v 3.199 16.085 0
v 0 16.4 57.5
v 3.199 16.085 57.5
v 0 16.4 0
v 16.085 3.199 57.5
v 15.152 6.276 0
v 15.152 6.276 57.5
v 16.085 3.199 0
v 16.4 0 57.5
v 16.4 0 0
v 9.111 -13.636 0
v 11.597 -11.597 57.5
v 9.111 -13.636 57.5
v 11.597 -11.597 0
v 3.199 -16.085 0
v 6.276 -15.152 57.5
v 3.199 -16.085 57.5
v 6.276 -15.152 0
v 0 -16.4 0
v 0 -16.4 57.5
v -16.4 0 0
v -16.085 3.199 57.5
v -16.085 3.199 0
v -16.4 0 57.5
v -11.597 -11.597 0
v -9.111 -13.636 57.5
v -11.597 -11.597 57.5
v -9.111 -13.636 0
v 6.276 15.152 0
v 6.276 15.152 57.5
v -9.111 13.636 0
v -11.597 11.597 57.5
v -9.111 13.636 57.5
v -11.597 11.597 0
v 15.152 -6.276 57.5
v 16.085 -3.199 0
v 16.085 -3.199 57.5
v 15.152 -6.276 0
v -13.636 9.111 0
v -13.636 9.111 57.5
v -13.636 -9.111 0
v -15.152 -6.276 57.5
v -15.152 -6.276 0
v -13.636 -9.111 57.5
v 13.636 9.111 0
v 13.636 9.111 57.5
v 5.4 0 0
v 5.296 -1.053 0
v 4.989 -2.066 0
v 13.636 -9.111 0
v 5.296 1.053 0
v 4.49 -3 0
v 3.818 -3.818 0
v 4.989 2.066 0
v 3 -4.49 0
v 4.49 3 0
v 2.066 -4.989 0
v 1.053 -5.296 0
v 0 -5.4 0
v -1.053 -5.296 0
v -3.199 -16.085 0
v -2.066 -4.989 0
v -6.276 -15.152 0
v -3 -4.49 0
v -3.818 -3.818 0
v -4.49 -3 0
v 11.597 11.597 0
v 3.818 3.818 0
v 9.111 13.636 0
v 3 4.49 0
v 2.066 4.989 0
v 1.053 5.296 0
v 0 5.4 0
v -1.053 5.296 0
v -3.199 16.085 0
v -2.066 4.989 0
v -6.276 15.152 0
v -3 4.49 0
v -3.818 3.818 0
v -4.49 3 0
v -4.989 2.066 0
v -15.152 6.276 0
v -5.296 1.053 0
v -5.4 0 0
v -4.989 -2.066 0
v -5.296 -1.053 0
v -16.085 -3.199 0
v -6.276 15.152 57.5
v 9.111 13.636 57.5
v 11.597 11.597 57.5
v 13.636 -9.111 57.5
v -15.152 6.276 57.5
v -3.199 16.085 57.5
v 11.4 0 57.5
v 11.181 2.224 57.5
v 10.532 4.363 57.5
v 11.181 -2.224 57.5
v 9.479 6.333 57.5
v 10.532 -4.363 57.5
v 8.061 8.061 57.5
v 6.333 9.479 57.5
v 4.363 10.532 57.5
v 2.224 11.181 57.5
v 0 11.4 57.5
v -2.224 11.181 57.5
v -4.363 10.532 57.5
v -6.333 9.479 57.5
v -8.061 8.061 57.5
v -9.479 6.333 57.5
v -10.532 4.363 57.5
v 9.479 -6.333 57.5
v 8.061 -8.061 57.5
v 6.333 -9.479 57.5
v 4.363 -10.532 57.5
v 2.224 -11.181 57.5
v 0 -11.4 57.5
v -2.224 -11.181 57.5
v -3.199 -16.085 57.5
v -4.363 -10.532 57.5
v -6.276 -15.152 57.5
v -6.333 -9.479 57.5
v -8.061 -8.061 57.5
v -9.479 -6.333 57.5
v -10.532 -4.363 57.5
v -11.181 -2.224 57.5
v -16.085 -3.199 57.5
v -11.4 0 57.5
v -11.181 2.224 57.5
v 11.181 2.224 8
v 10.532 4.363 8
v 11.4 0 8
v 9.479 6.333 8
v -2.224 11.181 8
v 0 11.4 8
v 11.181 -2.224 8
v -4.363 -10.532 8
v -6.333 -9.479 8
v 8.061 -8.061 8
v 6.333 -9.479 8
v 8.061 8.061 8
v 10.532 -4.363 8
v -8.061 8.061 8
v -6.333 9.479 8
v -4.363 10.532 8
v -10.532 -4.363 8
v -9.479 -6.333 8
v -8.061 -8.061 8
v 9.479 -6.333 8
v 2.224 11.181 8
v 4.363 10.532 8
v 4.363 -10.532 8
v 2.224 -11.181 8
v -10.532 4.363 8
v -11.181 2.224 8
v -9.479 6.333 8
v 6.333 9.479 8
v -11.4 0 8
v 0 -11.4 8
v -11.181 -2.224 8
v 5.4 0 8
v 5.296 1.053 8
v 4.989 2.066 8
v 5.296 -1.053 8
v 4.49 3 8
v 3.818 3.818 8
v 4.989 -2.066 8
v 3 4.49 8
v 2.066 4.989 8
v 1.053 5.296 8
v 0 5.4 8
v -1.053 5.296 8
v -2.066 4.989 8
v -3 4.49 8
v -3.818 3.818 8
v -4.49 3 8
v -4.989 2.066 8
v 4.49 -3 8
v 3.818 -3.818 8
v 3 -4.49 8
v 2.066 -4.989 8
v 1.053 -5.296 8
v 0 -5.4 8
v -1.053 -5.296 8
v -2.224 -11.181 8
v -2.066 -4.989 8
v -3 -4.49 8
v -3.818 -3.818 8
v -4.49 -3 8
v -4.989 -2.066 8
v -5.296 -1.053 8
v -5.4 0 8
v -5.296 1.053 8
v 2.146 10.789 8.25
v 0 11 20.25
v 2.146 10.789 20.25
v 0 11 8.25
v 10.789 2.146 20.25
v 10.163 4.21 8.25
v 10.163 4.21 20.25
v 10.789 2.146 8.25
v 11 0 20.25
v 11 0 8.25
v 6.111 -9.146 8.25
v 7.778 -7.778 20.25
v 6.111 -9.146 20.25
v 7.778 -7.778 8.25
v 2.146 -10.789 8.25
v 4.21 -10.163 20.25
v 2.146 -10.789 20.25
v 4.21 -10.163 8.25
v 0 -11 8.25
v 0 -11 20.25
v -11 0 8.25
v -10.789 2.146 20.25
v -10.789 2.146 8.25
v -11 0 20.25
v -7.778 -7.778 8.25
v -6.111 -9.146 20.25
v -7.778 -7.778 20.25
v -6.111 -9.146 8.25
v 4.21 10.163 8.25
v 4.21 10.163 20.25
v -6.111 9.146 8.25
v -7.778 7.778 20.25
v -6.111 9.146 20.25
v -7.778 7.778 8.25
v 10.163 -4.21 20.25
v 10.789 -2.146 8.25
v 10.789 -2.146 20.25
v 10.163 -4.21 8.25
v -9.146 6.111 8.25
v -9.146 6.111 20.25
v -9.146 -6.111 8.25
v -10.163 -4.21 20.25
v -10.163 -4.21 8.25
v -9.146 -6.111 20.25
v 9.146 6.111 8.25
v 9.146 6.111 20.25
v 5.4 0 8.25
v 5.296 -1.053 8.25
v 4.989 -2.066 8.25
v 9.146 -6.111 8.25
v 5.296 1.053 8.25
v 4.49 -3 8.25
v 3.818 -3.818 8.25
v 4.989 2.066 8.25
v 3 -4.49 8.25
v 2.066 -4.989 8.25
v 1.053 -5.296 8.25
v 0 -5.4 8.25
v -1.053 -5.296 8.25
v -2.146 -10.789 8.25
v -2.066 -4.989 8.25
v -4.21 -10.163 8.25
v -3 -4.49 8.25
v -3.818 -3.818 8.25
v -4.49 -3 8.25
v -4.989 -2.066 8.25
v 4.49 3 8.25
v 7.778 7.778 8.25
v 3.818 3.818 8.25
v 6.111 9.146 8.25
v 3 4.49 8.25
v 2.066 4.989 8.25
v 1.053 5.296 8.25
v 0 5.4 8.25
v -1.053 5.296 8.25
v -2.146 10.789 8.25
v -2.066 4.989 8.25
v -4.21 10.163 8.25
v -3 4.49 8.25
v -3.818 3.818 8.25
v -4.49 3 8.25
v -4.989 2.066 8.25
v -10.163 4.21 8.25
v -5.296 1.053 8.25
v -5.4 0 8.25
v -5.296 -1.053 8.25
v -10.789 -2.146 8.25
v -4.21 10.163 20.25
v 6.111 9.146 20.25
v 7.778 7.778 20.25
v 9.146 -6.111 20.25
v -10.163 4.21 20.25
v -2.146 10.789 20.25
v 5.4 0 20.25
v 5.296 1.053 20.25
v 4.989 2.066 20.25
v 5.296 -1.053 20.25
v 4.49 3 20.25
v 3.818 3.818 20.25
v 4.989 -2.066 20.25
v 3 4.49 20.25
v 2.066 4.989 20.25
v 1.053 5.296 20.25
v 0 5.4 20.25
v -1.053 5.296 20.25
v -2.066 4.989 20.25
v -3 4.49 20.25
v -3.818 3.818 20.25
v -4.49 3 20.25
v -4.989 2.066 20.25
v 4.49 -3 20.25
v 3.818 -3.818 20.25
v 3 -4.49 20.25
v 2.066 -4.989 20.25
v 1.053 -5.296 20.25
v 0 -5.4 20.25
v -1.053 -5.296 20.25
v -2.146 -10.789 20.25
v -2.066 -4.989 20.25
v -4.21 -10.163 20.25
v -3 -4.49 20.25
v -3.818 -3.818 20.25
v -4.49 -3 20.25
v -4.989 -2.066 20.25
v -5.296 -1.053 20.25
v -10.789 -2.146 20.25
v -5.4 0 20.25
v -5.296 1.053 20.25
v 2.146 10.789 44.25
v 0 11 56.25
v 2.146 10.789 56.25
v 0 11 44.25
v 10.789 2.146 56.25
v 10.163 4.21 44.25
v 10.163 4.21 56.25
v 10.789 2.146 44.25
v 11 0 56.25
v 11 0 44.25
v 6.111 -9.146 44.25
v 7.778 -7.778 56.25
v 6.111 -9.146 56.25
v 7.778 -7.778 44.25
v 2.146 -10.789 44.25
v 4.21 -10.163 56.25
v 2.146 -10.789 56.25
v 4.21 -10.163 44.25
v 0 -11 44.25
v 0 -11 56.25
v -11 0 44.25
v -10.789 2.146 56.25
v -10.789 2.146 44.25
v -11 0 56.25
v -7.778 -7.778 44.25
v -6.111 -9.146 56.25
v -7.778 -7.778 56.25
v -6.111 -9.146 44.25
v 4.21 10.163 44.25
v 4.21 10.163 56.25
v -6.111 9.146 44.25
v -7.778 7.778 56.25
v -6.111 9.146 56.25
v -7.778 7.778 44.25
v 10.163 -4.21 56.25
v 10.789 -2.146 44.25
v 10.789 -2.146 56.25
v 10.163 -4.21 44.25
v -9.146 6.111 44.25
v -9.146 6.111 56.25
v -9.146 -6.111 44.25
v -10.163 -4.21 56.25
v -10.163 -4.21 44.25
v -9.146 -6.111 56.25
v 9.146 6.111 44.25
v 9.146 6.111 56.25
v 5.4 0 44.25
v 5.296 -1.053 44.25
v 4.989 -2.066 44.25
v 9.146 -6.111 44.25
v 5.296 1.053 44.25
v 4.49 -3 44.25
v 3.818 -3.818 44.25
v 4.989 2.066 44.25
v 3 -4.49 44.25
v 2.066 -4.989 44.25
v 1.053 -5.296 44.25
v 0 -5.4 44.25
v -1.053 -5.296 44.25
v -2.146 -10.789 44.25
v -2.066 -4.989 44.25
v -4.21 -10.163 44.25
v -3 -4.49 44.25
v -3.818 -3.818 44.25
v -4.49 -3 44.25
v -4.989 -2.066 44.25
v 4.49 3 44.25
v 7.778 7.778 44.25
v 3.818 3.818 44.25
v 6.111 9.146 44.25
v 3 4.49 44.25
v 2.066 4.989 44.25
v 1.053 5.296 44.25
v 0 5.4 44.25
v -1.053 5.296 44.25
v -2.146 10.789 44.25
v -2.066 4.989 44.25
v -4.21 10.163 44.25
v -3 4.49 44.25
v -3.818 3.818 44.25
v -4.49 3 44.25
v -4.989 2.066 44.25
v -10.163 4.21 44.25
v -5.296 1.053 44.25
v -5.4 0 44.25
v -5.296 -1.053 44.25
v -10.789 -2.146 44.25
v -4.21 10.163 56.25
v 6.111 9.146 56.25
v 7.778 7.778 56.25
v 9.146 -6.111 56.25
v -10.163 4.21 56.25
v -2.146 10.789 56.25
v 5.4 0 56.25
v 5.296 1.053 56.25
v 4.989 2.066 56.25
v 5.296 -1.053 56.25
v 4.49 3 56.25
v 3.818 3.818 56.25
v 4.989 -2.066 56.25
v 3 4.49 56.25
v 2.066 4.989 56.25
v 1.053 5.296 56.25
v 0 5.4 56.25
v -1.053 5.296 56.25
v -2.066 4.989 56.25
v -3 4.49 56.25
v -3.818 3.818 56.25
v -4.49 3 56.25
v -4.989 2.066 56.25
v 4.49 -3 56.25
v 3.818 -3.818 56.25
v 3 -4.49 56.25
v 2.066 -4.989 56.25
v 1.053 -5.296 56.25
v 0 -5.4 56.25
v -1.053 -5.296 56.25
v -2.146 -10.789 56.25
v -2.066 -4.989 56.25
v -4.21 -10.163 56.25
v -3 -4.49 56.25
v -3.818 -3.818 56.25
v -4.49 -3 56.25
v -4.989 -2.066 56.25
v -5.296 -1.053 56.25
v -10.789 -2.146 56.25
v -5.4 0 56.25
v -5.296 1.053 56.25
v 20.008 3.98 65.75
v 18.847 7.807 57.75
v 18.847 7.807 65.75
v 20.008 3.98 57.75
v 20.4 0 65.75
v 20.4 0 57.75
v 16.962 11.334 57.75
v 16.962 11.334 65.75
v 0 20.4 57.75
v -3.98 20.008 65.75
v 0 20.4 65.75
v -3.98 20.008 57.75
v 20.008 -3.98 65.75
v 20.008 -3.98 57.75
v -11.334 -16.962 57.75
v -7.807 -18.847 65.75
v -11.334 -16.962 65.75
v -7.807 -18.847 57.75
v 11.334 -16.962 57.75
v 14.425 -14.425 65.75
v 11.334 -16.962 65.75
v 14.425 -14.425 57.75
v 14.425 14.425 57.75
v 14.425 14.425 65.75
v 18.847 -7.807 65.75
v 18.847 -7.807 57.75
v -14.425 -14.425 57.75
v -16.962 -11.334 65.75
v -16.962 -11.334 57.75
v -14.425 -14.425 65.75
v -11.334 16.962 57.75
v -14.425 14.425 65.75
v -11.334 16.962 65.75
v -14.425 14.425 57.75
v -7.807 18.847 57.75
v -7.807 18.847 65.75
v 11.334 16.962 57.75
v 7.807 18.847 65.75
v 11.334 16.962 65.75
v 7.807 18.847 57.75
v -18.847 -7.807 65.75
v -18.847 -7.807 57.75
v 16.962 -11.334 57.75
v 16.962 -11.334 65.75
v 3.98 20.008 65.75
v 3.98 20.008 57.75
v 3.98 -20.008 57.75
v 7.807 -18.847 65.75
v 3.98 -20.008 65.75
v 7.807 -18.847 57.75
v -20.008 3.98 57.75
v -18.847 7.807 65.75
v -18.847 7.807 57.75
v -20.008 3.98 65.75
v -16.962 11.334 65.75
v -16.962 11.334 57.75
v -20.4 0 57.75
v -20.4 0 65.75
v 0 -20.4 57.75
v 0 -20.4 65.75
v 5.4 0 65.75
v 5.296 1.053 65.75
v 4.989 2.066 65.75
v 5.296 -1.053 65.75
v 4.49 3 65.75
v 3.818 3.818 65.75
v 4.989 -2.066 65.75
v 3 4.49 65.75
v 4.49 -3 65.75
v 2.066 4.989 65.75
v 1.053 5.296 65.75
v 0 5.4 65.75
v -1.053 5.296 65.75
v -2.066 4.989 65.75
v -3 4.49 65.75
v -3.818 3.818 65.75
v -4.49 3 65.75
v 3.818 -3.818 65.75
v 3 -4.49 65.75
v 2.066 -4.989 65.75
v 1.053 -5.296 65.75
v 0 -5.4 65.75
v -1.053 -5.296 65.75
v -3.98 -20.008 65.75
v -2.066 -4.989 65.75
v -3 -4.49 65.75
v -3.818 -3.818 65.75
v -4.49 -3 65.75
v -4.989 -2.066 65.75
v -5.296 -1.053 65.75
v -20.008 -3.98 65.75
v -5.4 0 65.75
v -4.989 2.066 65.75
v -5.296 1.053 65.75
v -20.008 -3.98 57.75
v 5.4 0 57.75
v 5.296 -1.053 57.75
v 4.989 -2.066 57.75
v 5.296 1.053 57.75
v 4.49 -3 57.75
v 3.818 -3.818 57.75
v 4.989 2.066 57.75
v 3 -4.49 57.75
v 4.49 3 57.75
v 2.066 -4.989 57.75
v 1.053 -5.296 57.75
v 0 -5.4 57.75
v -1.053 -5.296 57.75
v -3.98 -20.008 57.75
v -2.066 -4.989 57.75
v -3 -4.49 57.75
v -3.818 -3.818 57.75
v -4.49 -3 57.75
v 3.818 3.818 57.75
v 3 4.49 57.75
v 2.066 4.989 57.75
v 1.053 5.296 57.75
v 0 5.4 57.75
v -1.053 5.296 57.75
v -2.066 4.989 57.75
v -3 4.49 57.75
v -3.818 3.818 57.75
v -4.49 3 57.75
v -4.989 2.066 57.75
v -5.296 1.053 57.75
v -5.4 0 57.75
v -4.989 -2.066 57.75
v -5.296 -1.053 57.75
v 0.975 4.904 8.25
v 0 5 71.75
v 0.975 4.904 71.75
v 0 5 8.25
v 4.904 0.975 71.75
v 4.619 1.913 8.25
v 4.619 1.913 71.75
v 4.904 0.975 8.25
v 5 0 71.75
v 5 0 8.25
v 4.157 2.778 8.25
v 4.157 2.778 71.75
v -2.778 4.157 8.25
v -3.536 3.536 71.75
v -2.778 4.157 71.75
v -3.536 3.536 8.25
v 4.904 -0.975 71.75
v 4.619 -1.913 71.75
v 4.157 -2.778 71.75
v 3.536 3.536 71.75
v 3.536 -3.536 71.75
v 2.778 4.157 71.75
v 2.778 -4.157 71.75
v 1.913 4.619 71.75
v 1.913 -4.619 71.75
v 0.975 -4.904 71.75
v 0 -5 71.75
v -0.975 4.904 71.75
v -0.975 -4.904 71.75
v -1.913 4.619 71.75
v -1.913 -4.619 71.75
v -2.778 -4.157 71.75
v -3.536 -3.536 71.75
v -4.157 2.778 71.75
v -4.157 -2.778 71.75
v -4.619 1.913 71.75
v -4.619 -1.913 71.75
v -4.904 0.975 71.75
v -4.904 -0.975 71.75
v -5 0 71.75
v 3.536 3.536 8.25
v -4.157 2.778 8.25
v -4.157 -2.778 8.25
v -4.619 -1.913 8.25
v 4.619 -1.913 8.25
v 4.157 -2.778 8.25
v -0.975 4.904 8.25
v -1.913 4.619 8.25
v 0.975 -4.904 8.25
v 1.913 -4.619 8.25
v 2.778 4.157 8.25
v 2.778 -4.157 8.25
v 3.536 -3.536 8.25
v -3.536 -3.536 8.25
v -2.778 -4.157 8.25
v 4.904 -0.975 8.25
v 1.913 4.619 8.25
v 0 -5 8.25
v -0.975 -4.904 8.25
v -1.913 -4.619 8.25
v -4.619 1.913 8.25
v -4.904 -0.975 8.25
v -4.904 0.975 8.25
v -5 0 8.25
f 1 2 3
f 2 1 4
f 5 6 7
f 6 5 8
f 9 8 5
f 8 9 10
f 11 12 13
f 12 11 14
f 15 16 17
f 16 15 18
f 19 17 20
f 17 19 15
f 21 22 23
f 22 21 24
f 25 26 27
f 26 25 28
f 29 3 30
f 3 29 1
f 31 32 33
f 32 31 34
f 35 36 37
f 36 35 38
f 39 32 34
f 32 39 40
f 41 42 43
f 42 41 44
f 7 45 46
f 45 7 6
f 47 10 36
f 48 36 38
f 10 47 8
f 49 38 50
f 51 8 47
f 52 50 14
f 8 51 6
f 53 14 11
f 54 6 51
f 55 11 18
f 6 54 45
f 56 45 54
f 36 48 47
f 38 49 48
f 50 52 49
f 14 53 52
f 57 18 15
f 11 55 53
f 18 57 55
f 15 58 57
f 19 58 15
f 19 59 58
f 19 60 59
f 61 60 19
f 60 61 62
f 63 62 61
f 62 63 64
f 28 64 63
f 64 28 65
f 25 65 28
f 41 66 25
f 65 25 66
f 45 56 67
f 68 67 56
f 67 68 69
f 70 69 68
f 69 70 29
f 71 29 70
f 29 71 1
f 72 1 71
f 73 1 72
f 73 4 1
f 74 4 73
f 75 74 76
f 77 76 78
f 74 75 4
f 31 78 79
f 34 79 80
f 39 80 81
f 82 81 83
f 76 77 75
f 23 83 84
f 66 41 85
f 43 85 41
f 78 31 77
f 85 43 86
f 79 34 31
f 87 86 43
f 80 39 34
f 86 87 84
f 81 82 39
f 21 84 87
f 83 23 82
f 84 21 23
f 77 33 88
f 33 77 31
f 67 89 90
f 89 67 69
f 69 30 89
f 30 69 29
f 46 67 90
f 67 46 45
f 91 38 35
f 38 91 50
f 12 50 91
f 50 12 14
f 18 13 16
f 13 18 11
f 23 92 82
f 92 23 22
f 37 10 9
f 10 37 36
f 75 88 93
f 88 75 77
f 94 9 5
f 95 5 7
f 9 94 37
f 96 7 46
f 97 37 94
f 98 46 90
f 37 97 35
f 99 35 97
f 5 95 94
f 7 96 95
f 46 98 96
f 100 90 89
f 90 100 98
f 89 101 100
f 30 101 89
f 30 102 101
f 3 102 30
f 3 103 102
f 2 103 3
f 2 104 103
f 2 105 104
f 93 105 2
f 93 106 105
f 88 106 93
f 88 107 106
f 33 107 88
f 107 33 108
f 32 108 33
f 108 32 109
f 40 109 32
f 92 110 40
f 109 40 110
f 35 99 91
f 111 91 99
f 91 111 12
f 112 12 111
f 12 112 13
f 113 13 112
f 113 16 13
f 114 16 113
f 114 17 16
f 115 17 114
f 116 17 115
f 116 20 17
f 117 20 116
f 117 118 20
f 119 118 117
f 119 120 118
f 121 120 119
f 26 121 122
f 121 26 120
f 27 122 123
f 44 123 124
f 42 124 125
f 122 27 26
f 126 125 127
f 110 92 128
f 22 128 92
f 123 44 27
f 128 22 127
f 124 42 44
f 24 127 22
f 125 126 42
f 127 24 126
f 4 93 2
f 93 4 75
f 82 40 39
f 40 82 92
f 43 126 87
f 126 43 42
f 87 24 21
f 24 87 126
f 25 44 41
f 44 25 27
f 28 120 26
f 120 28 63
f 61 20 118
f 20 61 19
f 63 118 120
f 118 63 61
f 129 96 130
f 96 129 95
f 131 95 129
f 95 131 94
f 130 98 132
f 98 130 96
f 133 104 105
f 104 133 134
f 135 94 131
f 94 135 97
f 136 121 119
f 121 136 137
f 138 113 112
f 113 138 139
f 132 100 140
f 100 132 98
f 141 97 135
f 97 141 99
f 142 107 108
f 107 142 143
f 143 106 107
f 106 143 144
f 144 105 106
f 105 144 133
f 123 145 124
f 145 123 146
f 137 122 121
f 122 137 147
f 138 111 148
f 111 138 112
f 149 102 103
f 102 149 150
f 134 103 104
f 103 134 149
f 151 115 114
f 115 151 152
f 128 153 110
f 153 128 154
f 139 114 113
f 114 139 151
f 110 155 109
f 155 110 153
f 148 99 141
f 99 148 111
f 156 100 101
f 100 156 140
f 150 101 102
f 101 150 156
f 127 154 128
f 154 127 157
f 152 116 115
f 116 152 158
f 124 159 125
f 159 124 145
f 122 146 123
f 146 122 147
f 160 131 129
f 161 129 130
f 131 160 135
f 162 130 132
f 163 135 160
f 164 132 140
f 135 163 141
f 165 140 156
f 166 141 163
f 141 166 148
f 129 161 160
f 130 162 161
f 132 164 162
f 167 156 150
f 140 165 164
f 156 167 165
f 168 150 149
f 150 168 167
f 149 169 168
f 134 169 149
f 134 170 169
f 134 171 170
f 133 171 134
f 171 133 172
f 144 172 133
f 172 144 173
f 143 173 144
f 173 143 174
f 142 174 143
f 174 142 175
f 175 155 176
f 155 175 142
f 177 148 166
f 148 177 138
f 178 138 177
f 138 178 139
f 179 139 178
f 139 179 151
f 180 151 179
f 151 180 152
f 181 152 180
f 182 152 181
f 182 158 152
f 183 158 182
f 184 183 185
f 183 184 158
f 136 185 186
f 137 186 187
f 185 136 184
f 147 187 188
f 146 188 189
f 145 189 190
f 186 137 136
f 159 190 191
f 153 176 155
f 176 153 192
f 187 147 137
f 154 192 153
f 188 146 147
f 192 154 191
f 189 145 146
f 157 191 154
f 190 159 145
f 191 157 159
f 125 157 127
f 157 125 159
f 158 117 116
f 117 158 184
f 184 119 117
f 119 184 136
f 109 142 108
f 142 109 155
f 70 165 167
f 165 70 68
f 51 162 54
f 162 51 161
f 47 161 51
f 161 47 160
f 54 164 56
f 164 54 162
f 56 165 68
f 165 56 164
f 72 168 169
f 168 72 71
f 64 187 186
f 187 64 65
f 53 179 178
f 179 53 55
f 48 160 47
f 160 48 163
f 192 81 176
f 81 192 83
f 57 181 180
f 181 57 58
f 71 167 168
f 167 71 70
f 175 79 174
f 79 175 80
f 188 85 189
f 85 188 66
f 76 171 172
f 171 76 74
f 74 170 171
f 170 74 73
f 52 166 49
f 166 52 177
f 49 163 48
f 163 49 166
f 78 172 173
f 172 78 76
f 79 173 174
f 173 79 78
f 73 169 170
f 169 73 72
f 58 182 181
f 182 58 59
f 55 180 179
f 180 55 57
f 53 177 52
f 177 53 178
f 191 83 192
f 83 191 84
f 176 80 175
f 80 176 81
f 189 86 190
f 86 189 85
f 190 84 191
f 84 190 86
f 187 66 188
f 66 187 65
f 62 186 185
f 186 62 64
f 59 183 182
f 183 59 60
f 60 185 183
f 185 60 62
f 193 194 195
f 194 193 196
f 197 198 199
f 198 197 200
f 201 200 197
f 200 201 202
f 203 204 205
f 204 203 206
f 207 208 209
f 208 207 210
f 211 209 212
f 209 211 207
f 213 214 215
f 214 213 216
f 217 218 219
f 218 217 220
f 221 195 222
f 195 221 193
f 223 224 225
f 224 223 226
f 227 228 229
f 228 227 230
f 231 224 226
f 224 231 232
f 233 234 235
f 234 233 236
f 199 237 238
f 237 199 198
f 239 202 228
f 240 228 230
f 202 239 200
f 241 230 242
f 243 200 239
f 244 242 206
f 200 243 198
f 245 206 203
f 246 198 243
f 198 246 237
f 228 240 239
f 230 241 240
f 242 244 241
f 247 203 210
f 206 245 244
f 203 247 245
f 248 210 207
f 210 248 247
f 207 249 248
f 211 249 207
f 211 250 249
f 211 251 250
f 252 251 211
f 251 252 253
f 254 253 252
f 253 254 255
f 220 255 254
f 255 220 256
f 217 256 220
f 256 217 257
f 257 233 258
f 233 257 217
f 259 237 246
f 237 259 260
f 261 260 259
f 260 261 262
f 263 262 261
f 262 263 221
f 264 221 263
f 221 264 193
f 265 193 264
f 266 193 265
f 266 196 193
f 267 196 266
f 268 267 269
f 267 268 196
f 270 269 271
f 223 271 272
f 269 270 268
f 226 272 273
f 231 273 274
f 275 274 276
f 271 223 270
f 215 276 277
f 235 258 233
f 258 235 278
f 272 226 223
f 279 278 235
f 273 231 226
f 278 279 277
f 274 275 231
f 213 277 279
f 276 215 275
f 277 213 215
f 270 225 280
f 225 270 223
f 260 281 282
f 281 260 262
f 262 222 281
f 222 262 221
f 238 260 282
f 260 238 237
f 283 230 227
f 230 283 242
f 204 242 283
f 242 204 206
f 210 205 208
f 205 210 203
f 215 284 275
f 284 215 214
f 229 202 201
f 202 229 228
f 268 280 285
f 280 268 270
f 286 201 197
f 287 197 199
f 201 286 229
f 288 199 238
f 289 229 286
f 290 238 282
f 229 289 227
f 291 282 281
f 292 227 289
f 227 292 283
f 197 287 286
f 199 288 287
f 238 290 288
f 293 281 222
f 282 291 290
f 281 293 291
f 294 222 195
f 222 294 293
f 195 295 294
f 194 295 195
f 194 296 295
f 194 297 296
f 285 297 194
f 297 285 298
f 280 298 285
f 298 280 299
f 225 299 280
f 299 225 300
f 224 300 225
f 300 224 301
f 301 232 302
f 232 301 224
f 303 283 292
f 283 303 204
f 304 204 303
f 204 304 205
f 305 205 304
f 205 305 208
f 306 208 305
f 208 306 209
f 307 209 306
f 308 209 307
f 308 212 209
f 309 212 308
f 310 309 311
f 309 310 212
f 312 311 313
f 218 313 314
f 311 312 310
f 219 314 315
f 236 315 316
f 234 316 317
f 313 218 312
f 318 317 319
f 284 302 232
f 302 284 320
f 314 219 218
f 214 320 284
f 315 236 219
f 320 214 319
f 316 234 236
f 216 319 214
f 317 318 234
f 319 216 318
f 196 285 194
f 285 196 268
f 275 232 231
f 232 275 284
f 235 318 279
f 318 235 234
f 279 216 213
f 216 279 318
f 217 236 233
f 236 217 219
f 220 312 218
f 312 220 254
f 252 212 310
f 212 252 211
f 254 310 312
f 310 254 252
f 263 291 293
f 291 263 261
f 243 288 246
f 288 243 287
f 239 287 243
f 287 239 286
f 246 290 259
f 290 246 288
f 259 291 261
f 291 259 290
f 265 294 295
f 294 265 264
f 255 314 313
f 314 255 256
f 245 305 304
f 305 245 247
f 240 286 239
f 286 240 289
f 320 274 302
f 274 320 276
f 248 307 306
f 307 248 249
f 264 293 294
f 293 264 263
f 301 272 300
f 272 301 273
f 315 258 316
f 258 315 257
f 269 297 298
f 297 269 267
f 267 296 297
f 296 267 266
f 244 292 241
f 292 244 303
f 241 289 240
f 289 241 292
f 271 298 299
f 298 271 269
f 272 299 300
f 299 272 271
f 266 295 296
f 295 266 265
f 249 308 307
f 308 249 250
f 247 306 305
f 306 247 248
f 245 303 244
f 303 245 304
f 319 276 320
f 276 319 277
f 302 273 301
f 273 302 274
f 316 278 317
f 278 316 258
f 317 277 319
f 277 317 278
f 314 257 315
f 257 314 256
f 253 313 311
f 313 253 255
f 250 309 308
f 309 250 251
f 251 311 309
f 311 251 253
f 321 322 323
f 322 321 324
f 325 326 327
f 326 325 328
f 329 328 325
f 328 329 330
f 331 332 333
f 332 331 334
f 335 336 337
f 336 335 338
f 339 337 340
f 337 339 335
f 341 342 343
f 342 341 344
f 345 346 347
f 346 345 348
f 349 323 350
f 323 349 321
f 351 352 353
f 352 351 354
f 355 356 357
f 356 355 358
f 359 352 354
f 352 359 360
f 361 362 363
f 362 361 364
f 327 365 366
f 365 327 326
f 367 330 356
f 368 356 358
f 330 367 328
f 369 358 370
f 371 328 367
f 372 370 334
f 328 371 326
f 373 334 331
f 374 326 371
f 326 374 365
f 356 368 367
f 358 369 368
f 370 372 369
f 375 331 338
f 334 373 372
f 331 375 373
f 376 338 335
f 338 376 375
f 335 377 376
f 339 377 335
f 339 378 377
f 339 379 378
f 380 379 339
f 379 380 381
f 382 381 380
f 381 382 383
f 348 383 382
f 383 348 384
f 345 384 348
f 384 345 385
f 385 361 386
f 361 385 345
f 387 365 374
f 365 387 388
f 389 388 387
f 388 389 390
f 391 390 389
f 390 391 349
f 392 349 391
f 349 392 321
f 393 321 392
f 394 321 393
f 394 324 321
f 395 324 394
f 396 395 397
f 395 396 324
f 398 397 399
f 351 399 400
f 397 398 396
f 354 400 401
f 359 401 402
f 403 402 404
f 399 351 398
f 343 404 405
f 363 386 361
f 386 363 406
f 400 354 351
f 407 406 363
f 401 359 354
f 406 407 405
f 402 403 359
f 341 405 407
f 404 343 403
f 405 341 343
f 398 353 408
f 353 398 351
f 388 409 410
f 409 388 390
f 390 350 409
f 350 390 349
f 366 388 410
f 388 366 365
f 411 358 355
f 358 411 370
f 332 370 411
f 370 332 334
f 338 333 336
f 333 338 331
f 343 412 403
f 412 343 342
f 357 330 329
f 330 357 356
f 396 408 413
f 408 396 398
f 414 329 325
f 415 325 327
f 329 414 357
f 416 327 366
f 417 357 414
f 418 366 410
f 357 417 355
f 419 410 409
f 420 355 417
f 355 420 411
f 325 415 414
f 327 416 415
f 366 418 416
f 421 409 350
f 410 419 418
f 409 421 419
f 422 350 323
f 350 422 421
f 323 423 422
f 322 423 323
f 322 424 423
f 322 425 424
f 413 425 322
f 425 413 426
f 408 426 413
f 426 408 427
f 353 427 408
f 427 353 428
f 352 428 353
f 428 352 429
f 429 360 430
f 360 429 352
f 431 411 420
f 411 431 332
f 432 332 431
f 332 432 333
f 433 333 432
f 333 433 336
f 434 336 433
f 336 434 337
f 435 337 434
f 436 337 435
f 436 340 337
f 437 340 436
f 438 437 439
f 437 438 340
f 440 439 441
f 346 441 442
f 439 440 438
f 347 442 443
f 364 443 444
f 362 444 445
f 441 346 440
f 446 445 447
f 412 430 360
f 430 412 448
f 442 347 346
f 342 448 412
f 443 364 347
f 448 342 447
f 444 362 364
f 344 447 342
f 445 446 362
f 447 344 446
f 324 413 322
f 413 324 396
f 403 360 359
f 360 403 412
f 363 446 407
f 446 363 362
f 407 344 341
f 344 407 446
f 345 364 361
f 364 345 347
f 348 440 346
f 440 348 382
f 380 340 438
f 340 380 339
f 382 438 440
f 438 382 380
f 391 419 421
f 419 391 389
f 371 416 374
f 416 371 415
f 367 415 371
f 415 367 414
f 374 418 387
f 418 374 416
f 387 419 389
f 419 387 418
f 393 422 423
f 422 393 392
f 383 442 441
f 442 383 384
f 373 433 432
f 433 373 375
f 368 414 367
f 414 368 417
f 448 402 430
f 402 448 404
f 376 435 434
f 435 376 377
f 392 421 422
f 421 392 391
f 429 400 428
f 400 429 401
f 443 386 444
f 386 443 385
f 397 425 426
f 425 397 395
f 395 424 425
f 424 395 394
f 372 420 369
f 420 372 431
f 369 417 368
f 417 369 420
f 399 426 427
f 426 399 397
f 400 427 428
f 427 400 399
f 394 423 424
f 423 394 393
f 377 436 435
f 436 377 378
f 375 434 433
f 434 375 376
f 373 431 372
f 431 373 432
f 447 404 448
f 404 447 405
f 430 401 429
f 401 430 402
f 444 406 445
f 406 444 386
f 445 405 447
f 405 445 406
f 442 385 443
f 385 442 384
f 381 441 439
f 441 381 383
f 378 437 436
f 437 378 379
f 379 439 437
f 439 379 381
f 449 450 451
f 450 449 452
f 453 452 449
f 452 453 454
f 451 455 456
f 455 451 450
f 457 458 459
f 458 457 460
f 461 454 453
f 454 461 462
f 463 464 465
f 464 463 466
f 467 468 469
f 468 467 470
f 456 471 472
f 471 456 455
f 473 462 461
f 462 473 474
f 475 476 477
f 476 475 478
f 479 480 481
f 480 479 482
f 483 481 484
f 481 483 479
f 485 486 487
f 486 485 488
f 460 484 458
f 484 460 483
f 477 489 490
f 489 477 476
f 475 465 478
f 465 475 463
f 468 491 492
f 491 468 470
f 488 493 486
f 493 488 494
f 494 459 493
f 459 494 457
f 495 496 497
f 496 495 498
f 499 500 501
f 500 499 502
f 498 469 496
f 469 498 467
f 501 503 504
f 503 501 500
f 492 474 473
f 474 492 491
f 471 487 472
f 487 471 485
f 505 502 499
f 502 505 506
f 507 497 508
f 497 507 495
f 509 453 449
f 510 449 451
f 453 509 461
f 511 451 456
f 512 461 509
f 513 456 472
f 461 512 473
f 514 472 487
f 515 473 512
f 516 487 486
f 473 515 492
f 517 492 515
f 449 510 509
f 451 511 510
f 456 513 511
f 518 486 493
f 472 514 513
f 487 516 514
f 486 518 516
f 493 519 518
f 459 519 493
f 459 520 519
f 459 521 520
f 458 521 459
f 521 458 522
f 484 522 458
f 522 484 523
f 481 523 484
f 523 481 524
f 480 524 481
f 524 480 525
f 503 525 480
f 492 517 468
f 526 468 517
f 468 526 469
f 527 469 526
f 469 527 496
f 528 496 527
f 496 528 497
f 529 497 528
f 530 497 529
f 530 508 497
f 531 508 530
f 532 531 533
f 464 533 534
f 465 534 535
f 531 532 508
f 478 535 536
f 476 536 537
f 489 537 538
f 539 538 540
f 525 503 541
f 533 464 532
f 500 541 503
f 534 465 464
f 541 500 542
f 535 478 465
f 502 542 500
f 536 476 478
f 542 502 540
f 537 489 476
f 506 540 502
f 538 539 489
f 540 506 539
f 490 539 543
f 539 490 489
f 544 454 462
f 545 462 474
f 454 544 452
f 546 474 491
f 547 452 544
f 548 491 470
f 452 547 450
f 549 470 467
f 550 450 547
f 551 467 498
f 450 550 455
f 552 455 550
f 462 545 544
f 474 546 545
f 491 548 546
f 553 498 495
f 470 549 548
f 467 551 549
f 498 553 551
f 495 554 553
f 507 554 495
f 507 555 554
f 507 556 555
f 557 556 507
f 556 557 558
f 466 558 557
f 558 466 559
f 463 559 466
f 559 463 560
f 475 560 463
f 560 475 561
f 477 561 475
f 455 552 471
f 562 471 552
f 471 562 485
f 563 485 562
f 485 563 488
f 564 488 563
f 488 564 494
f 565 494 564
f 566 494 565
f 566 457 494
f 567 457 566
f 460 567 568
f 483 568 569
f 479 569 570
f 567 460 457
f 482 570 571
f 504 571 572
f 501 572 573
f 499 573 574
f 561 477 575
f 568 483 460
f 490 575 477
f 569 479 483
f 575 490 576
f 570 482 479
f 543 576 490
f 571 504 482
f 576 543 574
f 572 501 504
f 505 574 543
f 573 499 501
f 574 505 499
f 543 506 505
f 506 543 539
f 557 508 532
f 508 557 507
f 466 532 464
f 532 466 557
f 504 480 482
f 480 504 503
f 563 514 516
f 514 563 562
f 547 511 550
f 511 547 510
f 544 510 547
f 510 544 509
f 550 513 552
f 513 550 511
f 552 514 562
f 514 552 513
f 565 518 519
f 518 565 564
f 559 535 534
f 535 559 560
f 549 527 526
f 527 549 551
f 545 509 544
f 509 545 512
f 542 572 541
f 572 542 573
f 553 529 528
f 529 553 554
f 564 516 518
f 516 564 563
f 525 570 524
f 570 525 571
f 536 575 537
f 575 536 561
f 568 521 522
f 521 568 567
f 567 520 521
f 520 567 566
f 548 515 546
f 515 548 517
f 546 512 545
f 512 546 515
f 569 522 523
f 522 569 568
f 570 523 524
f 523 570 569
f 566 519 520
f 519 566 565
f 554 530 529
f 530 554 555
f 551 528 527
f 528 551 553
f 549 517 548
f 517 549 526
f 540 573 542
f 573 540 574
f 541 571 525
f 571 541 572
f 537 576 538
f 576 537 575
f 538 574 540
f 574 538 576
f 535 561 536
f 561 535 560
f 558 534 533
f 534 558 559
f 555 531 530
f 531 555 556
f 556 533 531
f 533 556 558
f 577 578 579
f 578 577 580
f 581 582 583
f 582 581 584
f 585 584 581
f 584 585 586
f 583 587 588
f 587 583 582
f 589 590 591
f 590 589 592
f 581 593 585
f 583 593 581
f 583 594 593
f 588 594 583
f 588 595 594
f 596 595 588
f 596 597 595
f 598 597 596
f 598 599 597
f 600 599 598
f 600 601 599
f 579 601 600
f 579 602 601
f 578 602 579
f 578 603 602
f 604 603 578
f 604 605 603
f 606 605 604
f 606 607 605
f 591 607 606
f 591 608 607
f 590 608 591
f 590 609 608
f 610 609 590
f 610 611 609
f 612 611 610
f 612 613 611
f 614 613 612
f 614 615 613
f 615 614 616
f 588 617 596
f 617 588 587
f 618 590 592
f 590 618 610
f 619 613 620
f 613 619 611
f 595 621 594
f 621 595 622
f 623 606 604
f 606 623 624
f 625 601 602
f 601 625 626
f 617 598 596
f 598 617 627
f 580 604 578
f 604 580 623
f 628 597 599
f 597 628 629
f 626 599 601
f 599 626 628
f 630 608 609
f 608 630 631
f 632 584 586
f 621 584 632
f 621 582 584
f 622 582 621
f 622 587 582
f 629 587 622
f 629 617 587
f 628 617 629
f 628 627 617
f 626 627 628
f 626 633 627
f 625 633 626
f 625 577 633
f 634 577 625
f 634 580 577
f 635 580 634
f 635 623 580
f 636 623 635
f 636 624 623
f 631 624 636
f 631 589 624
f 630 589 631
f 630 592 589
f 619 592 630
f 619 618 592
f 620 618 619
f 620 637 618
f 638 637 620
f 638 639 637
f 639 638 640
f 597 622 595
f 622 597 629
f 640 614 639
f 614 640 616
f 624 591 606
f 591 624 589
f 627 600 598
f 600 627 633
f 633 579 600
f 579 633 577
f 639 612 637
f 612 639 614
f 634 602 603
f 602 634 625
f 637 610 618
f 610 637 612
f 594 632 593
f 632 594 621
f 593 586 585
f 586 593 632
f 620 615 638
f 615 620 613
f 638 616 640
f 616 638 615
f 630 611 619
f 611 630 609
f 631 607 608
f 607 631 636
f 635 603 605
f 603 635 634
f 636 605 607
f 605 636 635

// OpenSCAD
$fn = 32;

// ------------------------------------------------------------------------
// Shaft station: cup d32.8 x 57.5 mm, shaft d10
// Every part is its own module, assembly() places every instance.
// ------------------------------------------------------------------------

// --- part 1 ---
module housing_cup() {
  difference() {
    cylinder(h = 57.5, d = 32.8);
    translate([0, 0, 8]) cylinder(h = 50.5, d = 22.8);
    translate([0, 0, -1]) cylinder(h = 10, d = 10.8);
  }
}

// --- part 2 ---
module bearing_lower() {
  difference() {
      translate([0, 0, 0]) cylinder(h = 12, d = 22);
      translate([0, 0, -1]) cylinder(h = 14, d = 10.8);
    }
}

// --- part 3 ---
module bearing_upper() {
  difference() {
      translate([0, 0, 0]) cylinder(h = 12, d = 22);
      translate([0, 0, -1]) cylinder(h = 14, d = 10.8);
    }
}

// --- part 4 ---
module station_shaft() {
  translate([0, 0, -31.75]) cylinder(h = 63.5, d = 10);
}

// --- part 5 ---
module station_cover() {
  difference() {
    cylinder(h = 8, d = 40.8);
    translate([0, 0, -1]) cylinder(h = 10, d = 10.8);
  }
}

// --- assembly ---
module assembly() {
  color([0.80, 0.24, 0.20]) translate([0, 0, 0]) rotate([0, 0, 0]) housing_cup();
  color([0.20, 0.45, 0.75]) translate([0, 0, 8.25]) rotate([0, 0, 0]) bearing_lower();
  color([0.25, 0.62, 0.32]) translate([0, 0, 44.25]) rotate([0, 0, 0]) bearing_upper();
  color([0.92, 0.70, 0.18]) translate([0, 0, 40]) rotate([0, 0, 0]) station_shaft();
  color([0.58, 0.35, 0.70]) translate([0, 0, 57.75]) rotate([0, 0, 0]) station_cover();
}

assembly();
